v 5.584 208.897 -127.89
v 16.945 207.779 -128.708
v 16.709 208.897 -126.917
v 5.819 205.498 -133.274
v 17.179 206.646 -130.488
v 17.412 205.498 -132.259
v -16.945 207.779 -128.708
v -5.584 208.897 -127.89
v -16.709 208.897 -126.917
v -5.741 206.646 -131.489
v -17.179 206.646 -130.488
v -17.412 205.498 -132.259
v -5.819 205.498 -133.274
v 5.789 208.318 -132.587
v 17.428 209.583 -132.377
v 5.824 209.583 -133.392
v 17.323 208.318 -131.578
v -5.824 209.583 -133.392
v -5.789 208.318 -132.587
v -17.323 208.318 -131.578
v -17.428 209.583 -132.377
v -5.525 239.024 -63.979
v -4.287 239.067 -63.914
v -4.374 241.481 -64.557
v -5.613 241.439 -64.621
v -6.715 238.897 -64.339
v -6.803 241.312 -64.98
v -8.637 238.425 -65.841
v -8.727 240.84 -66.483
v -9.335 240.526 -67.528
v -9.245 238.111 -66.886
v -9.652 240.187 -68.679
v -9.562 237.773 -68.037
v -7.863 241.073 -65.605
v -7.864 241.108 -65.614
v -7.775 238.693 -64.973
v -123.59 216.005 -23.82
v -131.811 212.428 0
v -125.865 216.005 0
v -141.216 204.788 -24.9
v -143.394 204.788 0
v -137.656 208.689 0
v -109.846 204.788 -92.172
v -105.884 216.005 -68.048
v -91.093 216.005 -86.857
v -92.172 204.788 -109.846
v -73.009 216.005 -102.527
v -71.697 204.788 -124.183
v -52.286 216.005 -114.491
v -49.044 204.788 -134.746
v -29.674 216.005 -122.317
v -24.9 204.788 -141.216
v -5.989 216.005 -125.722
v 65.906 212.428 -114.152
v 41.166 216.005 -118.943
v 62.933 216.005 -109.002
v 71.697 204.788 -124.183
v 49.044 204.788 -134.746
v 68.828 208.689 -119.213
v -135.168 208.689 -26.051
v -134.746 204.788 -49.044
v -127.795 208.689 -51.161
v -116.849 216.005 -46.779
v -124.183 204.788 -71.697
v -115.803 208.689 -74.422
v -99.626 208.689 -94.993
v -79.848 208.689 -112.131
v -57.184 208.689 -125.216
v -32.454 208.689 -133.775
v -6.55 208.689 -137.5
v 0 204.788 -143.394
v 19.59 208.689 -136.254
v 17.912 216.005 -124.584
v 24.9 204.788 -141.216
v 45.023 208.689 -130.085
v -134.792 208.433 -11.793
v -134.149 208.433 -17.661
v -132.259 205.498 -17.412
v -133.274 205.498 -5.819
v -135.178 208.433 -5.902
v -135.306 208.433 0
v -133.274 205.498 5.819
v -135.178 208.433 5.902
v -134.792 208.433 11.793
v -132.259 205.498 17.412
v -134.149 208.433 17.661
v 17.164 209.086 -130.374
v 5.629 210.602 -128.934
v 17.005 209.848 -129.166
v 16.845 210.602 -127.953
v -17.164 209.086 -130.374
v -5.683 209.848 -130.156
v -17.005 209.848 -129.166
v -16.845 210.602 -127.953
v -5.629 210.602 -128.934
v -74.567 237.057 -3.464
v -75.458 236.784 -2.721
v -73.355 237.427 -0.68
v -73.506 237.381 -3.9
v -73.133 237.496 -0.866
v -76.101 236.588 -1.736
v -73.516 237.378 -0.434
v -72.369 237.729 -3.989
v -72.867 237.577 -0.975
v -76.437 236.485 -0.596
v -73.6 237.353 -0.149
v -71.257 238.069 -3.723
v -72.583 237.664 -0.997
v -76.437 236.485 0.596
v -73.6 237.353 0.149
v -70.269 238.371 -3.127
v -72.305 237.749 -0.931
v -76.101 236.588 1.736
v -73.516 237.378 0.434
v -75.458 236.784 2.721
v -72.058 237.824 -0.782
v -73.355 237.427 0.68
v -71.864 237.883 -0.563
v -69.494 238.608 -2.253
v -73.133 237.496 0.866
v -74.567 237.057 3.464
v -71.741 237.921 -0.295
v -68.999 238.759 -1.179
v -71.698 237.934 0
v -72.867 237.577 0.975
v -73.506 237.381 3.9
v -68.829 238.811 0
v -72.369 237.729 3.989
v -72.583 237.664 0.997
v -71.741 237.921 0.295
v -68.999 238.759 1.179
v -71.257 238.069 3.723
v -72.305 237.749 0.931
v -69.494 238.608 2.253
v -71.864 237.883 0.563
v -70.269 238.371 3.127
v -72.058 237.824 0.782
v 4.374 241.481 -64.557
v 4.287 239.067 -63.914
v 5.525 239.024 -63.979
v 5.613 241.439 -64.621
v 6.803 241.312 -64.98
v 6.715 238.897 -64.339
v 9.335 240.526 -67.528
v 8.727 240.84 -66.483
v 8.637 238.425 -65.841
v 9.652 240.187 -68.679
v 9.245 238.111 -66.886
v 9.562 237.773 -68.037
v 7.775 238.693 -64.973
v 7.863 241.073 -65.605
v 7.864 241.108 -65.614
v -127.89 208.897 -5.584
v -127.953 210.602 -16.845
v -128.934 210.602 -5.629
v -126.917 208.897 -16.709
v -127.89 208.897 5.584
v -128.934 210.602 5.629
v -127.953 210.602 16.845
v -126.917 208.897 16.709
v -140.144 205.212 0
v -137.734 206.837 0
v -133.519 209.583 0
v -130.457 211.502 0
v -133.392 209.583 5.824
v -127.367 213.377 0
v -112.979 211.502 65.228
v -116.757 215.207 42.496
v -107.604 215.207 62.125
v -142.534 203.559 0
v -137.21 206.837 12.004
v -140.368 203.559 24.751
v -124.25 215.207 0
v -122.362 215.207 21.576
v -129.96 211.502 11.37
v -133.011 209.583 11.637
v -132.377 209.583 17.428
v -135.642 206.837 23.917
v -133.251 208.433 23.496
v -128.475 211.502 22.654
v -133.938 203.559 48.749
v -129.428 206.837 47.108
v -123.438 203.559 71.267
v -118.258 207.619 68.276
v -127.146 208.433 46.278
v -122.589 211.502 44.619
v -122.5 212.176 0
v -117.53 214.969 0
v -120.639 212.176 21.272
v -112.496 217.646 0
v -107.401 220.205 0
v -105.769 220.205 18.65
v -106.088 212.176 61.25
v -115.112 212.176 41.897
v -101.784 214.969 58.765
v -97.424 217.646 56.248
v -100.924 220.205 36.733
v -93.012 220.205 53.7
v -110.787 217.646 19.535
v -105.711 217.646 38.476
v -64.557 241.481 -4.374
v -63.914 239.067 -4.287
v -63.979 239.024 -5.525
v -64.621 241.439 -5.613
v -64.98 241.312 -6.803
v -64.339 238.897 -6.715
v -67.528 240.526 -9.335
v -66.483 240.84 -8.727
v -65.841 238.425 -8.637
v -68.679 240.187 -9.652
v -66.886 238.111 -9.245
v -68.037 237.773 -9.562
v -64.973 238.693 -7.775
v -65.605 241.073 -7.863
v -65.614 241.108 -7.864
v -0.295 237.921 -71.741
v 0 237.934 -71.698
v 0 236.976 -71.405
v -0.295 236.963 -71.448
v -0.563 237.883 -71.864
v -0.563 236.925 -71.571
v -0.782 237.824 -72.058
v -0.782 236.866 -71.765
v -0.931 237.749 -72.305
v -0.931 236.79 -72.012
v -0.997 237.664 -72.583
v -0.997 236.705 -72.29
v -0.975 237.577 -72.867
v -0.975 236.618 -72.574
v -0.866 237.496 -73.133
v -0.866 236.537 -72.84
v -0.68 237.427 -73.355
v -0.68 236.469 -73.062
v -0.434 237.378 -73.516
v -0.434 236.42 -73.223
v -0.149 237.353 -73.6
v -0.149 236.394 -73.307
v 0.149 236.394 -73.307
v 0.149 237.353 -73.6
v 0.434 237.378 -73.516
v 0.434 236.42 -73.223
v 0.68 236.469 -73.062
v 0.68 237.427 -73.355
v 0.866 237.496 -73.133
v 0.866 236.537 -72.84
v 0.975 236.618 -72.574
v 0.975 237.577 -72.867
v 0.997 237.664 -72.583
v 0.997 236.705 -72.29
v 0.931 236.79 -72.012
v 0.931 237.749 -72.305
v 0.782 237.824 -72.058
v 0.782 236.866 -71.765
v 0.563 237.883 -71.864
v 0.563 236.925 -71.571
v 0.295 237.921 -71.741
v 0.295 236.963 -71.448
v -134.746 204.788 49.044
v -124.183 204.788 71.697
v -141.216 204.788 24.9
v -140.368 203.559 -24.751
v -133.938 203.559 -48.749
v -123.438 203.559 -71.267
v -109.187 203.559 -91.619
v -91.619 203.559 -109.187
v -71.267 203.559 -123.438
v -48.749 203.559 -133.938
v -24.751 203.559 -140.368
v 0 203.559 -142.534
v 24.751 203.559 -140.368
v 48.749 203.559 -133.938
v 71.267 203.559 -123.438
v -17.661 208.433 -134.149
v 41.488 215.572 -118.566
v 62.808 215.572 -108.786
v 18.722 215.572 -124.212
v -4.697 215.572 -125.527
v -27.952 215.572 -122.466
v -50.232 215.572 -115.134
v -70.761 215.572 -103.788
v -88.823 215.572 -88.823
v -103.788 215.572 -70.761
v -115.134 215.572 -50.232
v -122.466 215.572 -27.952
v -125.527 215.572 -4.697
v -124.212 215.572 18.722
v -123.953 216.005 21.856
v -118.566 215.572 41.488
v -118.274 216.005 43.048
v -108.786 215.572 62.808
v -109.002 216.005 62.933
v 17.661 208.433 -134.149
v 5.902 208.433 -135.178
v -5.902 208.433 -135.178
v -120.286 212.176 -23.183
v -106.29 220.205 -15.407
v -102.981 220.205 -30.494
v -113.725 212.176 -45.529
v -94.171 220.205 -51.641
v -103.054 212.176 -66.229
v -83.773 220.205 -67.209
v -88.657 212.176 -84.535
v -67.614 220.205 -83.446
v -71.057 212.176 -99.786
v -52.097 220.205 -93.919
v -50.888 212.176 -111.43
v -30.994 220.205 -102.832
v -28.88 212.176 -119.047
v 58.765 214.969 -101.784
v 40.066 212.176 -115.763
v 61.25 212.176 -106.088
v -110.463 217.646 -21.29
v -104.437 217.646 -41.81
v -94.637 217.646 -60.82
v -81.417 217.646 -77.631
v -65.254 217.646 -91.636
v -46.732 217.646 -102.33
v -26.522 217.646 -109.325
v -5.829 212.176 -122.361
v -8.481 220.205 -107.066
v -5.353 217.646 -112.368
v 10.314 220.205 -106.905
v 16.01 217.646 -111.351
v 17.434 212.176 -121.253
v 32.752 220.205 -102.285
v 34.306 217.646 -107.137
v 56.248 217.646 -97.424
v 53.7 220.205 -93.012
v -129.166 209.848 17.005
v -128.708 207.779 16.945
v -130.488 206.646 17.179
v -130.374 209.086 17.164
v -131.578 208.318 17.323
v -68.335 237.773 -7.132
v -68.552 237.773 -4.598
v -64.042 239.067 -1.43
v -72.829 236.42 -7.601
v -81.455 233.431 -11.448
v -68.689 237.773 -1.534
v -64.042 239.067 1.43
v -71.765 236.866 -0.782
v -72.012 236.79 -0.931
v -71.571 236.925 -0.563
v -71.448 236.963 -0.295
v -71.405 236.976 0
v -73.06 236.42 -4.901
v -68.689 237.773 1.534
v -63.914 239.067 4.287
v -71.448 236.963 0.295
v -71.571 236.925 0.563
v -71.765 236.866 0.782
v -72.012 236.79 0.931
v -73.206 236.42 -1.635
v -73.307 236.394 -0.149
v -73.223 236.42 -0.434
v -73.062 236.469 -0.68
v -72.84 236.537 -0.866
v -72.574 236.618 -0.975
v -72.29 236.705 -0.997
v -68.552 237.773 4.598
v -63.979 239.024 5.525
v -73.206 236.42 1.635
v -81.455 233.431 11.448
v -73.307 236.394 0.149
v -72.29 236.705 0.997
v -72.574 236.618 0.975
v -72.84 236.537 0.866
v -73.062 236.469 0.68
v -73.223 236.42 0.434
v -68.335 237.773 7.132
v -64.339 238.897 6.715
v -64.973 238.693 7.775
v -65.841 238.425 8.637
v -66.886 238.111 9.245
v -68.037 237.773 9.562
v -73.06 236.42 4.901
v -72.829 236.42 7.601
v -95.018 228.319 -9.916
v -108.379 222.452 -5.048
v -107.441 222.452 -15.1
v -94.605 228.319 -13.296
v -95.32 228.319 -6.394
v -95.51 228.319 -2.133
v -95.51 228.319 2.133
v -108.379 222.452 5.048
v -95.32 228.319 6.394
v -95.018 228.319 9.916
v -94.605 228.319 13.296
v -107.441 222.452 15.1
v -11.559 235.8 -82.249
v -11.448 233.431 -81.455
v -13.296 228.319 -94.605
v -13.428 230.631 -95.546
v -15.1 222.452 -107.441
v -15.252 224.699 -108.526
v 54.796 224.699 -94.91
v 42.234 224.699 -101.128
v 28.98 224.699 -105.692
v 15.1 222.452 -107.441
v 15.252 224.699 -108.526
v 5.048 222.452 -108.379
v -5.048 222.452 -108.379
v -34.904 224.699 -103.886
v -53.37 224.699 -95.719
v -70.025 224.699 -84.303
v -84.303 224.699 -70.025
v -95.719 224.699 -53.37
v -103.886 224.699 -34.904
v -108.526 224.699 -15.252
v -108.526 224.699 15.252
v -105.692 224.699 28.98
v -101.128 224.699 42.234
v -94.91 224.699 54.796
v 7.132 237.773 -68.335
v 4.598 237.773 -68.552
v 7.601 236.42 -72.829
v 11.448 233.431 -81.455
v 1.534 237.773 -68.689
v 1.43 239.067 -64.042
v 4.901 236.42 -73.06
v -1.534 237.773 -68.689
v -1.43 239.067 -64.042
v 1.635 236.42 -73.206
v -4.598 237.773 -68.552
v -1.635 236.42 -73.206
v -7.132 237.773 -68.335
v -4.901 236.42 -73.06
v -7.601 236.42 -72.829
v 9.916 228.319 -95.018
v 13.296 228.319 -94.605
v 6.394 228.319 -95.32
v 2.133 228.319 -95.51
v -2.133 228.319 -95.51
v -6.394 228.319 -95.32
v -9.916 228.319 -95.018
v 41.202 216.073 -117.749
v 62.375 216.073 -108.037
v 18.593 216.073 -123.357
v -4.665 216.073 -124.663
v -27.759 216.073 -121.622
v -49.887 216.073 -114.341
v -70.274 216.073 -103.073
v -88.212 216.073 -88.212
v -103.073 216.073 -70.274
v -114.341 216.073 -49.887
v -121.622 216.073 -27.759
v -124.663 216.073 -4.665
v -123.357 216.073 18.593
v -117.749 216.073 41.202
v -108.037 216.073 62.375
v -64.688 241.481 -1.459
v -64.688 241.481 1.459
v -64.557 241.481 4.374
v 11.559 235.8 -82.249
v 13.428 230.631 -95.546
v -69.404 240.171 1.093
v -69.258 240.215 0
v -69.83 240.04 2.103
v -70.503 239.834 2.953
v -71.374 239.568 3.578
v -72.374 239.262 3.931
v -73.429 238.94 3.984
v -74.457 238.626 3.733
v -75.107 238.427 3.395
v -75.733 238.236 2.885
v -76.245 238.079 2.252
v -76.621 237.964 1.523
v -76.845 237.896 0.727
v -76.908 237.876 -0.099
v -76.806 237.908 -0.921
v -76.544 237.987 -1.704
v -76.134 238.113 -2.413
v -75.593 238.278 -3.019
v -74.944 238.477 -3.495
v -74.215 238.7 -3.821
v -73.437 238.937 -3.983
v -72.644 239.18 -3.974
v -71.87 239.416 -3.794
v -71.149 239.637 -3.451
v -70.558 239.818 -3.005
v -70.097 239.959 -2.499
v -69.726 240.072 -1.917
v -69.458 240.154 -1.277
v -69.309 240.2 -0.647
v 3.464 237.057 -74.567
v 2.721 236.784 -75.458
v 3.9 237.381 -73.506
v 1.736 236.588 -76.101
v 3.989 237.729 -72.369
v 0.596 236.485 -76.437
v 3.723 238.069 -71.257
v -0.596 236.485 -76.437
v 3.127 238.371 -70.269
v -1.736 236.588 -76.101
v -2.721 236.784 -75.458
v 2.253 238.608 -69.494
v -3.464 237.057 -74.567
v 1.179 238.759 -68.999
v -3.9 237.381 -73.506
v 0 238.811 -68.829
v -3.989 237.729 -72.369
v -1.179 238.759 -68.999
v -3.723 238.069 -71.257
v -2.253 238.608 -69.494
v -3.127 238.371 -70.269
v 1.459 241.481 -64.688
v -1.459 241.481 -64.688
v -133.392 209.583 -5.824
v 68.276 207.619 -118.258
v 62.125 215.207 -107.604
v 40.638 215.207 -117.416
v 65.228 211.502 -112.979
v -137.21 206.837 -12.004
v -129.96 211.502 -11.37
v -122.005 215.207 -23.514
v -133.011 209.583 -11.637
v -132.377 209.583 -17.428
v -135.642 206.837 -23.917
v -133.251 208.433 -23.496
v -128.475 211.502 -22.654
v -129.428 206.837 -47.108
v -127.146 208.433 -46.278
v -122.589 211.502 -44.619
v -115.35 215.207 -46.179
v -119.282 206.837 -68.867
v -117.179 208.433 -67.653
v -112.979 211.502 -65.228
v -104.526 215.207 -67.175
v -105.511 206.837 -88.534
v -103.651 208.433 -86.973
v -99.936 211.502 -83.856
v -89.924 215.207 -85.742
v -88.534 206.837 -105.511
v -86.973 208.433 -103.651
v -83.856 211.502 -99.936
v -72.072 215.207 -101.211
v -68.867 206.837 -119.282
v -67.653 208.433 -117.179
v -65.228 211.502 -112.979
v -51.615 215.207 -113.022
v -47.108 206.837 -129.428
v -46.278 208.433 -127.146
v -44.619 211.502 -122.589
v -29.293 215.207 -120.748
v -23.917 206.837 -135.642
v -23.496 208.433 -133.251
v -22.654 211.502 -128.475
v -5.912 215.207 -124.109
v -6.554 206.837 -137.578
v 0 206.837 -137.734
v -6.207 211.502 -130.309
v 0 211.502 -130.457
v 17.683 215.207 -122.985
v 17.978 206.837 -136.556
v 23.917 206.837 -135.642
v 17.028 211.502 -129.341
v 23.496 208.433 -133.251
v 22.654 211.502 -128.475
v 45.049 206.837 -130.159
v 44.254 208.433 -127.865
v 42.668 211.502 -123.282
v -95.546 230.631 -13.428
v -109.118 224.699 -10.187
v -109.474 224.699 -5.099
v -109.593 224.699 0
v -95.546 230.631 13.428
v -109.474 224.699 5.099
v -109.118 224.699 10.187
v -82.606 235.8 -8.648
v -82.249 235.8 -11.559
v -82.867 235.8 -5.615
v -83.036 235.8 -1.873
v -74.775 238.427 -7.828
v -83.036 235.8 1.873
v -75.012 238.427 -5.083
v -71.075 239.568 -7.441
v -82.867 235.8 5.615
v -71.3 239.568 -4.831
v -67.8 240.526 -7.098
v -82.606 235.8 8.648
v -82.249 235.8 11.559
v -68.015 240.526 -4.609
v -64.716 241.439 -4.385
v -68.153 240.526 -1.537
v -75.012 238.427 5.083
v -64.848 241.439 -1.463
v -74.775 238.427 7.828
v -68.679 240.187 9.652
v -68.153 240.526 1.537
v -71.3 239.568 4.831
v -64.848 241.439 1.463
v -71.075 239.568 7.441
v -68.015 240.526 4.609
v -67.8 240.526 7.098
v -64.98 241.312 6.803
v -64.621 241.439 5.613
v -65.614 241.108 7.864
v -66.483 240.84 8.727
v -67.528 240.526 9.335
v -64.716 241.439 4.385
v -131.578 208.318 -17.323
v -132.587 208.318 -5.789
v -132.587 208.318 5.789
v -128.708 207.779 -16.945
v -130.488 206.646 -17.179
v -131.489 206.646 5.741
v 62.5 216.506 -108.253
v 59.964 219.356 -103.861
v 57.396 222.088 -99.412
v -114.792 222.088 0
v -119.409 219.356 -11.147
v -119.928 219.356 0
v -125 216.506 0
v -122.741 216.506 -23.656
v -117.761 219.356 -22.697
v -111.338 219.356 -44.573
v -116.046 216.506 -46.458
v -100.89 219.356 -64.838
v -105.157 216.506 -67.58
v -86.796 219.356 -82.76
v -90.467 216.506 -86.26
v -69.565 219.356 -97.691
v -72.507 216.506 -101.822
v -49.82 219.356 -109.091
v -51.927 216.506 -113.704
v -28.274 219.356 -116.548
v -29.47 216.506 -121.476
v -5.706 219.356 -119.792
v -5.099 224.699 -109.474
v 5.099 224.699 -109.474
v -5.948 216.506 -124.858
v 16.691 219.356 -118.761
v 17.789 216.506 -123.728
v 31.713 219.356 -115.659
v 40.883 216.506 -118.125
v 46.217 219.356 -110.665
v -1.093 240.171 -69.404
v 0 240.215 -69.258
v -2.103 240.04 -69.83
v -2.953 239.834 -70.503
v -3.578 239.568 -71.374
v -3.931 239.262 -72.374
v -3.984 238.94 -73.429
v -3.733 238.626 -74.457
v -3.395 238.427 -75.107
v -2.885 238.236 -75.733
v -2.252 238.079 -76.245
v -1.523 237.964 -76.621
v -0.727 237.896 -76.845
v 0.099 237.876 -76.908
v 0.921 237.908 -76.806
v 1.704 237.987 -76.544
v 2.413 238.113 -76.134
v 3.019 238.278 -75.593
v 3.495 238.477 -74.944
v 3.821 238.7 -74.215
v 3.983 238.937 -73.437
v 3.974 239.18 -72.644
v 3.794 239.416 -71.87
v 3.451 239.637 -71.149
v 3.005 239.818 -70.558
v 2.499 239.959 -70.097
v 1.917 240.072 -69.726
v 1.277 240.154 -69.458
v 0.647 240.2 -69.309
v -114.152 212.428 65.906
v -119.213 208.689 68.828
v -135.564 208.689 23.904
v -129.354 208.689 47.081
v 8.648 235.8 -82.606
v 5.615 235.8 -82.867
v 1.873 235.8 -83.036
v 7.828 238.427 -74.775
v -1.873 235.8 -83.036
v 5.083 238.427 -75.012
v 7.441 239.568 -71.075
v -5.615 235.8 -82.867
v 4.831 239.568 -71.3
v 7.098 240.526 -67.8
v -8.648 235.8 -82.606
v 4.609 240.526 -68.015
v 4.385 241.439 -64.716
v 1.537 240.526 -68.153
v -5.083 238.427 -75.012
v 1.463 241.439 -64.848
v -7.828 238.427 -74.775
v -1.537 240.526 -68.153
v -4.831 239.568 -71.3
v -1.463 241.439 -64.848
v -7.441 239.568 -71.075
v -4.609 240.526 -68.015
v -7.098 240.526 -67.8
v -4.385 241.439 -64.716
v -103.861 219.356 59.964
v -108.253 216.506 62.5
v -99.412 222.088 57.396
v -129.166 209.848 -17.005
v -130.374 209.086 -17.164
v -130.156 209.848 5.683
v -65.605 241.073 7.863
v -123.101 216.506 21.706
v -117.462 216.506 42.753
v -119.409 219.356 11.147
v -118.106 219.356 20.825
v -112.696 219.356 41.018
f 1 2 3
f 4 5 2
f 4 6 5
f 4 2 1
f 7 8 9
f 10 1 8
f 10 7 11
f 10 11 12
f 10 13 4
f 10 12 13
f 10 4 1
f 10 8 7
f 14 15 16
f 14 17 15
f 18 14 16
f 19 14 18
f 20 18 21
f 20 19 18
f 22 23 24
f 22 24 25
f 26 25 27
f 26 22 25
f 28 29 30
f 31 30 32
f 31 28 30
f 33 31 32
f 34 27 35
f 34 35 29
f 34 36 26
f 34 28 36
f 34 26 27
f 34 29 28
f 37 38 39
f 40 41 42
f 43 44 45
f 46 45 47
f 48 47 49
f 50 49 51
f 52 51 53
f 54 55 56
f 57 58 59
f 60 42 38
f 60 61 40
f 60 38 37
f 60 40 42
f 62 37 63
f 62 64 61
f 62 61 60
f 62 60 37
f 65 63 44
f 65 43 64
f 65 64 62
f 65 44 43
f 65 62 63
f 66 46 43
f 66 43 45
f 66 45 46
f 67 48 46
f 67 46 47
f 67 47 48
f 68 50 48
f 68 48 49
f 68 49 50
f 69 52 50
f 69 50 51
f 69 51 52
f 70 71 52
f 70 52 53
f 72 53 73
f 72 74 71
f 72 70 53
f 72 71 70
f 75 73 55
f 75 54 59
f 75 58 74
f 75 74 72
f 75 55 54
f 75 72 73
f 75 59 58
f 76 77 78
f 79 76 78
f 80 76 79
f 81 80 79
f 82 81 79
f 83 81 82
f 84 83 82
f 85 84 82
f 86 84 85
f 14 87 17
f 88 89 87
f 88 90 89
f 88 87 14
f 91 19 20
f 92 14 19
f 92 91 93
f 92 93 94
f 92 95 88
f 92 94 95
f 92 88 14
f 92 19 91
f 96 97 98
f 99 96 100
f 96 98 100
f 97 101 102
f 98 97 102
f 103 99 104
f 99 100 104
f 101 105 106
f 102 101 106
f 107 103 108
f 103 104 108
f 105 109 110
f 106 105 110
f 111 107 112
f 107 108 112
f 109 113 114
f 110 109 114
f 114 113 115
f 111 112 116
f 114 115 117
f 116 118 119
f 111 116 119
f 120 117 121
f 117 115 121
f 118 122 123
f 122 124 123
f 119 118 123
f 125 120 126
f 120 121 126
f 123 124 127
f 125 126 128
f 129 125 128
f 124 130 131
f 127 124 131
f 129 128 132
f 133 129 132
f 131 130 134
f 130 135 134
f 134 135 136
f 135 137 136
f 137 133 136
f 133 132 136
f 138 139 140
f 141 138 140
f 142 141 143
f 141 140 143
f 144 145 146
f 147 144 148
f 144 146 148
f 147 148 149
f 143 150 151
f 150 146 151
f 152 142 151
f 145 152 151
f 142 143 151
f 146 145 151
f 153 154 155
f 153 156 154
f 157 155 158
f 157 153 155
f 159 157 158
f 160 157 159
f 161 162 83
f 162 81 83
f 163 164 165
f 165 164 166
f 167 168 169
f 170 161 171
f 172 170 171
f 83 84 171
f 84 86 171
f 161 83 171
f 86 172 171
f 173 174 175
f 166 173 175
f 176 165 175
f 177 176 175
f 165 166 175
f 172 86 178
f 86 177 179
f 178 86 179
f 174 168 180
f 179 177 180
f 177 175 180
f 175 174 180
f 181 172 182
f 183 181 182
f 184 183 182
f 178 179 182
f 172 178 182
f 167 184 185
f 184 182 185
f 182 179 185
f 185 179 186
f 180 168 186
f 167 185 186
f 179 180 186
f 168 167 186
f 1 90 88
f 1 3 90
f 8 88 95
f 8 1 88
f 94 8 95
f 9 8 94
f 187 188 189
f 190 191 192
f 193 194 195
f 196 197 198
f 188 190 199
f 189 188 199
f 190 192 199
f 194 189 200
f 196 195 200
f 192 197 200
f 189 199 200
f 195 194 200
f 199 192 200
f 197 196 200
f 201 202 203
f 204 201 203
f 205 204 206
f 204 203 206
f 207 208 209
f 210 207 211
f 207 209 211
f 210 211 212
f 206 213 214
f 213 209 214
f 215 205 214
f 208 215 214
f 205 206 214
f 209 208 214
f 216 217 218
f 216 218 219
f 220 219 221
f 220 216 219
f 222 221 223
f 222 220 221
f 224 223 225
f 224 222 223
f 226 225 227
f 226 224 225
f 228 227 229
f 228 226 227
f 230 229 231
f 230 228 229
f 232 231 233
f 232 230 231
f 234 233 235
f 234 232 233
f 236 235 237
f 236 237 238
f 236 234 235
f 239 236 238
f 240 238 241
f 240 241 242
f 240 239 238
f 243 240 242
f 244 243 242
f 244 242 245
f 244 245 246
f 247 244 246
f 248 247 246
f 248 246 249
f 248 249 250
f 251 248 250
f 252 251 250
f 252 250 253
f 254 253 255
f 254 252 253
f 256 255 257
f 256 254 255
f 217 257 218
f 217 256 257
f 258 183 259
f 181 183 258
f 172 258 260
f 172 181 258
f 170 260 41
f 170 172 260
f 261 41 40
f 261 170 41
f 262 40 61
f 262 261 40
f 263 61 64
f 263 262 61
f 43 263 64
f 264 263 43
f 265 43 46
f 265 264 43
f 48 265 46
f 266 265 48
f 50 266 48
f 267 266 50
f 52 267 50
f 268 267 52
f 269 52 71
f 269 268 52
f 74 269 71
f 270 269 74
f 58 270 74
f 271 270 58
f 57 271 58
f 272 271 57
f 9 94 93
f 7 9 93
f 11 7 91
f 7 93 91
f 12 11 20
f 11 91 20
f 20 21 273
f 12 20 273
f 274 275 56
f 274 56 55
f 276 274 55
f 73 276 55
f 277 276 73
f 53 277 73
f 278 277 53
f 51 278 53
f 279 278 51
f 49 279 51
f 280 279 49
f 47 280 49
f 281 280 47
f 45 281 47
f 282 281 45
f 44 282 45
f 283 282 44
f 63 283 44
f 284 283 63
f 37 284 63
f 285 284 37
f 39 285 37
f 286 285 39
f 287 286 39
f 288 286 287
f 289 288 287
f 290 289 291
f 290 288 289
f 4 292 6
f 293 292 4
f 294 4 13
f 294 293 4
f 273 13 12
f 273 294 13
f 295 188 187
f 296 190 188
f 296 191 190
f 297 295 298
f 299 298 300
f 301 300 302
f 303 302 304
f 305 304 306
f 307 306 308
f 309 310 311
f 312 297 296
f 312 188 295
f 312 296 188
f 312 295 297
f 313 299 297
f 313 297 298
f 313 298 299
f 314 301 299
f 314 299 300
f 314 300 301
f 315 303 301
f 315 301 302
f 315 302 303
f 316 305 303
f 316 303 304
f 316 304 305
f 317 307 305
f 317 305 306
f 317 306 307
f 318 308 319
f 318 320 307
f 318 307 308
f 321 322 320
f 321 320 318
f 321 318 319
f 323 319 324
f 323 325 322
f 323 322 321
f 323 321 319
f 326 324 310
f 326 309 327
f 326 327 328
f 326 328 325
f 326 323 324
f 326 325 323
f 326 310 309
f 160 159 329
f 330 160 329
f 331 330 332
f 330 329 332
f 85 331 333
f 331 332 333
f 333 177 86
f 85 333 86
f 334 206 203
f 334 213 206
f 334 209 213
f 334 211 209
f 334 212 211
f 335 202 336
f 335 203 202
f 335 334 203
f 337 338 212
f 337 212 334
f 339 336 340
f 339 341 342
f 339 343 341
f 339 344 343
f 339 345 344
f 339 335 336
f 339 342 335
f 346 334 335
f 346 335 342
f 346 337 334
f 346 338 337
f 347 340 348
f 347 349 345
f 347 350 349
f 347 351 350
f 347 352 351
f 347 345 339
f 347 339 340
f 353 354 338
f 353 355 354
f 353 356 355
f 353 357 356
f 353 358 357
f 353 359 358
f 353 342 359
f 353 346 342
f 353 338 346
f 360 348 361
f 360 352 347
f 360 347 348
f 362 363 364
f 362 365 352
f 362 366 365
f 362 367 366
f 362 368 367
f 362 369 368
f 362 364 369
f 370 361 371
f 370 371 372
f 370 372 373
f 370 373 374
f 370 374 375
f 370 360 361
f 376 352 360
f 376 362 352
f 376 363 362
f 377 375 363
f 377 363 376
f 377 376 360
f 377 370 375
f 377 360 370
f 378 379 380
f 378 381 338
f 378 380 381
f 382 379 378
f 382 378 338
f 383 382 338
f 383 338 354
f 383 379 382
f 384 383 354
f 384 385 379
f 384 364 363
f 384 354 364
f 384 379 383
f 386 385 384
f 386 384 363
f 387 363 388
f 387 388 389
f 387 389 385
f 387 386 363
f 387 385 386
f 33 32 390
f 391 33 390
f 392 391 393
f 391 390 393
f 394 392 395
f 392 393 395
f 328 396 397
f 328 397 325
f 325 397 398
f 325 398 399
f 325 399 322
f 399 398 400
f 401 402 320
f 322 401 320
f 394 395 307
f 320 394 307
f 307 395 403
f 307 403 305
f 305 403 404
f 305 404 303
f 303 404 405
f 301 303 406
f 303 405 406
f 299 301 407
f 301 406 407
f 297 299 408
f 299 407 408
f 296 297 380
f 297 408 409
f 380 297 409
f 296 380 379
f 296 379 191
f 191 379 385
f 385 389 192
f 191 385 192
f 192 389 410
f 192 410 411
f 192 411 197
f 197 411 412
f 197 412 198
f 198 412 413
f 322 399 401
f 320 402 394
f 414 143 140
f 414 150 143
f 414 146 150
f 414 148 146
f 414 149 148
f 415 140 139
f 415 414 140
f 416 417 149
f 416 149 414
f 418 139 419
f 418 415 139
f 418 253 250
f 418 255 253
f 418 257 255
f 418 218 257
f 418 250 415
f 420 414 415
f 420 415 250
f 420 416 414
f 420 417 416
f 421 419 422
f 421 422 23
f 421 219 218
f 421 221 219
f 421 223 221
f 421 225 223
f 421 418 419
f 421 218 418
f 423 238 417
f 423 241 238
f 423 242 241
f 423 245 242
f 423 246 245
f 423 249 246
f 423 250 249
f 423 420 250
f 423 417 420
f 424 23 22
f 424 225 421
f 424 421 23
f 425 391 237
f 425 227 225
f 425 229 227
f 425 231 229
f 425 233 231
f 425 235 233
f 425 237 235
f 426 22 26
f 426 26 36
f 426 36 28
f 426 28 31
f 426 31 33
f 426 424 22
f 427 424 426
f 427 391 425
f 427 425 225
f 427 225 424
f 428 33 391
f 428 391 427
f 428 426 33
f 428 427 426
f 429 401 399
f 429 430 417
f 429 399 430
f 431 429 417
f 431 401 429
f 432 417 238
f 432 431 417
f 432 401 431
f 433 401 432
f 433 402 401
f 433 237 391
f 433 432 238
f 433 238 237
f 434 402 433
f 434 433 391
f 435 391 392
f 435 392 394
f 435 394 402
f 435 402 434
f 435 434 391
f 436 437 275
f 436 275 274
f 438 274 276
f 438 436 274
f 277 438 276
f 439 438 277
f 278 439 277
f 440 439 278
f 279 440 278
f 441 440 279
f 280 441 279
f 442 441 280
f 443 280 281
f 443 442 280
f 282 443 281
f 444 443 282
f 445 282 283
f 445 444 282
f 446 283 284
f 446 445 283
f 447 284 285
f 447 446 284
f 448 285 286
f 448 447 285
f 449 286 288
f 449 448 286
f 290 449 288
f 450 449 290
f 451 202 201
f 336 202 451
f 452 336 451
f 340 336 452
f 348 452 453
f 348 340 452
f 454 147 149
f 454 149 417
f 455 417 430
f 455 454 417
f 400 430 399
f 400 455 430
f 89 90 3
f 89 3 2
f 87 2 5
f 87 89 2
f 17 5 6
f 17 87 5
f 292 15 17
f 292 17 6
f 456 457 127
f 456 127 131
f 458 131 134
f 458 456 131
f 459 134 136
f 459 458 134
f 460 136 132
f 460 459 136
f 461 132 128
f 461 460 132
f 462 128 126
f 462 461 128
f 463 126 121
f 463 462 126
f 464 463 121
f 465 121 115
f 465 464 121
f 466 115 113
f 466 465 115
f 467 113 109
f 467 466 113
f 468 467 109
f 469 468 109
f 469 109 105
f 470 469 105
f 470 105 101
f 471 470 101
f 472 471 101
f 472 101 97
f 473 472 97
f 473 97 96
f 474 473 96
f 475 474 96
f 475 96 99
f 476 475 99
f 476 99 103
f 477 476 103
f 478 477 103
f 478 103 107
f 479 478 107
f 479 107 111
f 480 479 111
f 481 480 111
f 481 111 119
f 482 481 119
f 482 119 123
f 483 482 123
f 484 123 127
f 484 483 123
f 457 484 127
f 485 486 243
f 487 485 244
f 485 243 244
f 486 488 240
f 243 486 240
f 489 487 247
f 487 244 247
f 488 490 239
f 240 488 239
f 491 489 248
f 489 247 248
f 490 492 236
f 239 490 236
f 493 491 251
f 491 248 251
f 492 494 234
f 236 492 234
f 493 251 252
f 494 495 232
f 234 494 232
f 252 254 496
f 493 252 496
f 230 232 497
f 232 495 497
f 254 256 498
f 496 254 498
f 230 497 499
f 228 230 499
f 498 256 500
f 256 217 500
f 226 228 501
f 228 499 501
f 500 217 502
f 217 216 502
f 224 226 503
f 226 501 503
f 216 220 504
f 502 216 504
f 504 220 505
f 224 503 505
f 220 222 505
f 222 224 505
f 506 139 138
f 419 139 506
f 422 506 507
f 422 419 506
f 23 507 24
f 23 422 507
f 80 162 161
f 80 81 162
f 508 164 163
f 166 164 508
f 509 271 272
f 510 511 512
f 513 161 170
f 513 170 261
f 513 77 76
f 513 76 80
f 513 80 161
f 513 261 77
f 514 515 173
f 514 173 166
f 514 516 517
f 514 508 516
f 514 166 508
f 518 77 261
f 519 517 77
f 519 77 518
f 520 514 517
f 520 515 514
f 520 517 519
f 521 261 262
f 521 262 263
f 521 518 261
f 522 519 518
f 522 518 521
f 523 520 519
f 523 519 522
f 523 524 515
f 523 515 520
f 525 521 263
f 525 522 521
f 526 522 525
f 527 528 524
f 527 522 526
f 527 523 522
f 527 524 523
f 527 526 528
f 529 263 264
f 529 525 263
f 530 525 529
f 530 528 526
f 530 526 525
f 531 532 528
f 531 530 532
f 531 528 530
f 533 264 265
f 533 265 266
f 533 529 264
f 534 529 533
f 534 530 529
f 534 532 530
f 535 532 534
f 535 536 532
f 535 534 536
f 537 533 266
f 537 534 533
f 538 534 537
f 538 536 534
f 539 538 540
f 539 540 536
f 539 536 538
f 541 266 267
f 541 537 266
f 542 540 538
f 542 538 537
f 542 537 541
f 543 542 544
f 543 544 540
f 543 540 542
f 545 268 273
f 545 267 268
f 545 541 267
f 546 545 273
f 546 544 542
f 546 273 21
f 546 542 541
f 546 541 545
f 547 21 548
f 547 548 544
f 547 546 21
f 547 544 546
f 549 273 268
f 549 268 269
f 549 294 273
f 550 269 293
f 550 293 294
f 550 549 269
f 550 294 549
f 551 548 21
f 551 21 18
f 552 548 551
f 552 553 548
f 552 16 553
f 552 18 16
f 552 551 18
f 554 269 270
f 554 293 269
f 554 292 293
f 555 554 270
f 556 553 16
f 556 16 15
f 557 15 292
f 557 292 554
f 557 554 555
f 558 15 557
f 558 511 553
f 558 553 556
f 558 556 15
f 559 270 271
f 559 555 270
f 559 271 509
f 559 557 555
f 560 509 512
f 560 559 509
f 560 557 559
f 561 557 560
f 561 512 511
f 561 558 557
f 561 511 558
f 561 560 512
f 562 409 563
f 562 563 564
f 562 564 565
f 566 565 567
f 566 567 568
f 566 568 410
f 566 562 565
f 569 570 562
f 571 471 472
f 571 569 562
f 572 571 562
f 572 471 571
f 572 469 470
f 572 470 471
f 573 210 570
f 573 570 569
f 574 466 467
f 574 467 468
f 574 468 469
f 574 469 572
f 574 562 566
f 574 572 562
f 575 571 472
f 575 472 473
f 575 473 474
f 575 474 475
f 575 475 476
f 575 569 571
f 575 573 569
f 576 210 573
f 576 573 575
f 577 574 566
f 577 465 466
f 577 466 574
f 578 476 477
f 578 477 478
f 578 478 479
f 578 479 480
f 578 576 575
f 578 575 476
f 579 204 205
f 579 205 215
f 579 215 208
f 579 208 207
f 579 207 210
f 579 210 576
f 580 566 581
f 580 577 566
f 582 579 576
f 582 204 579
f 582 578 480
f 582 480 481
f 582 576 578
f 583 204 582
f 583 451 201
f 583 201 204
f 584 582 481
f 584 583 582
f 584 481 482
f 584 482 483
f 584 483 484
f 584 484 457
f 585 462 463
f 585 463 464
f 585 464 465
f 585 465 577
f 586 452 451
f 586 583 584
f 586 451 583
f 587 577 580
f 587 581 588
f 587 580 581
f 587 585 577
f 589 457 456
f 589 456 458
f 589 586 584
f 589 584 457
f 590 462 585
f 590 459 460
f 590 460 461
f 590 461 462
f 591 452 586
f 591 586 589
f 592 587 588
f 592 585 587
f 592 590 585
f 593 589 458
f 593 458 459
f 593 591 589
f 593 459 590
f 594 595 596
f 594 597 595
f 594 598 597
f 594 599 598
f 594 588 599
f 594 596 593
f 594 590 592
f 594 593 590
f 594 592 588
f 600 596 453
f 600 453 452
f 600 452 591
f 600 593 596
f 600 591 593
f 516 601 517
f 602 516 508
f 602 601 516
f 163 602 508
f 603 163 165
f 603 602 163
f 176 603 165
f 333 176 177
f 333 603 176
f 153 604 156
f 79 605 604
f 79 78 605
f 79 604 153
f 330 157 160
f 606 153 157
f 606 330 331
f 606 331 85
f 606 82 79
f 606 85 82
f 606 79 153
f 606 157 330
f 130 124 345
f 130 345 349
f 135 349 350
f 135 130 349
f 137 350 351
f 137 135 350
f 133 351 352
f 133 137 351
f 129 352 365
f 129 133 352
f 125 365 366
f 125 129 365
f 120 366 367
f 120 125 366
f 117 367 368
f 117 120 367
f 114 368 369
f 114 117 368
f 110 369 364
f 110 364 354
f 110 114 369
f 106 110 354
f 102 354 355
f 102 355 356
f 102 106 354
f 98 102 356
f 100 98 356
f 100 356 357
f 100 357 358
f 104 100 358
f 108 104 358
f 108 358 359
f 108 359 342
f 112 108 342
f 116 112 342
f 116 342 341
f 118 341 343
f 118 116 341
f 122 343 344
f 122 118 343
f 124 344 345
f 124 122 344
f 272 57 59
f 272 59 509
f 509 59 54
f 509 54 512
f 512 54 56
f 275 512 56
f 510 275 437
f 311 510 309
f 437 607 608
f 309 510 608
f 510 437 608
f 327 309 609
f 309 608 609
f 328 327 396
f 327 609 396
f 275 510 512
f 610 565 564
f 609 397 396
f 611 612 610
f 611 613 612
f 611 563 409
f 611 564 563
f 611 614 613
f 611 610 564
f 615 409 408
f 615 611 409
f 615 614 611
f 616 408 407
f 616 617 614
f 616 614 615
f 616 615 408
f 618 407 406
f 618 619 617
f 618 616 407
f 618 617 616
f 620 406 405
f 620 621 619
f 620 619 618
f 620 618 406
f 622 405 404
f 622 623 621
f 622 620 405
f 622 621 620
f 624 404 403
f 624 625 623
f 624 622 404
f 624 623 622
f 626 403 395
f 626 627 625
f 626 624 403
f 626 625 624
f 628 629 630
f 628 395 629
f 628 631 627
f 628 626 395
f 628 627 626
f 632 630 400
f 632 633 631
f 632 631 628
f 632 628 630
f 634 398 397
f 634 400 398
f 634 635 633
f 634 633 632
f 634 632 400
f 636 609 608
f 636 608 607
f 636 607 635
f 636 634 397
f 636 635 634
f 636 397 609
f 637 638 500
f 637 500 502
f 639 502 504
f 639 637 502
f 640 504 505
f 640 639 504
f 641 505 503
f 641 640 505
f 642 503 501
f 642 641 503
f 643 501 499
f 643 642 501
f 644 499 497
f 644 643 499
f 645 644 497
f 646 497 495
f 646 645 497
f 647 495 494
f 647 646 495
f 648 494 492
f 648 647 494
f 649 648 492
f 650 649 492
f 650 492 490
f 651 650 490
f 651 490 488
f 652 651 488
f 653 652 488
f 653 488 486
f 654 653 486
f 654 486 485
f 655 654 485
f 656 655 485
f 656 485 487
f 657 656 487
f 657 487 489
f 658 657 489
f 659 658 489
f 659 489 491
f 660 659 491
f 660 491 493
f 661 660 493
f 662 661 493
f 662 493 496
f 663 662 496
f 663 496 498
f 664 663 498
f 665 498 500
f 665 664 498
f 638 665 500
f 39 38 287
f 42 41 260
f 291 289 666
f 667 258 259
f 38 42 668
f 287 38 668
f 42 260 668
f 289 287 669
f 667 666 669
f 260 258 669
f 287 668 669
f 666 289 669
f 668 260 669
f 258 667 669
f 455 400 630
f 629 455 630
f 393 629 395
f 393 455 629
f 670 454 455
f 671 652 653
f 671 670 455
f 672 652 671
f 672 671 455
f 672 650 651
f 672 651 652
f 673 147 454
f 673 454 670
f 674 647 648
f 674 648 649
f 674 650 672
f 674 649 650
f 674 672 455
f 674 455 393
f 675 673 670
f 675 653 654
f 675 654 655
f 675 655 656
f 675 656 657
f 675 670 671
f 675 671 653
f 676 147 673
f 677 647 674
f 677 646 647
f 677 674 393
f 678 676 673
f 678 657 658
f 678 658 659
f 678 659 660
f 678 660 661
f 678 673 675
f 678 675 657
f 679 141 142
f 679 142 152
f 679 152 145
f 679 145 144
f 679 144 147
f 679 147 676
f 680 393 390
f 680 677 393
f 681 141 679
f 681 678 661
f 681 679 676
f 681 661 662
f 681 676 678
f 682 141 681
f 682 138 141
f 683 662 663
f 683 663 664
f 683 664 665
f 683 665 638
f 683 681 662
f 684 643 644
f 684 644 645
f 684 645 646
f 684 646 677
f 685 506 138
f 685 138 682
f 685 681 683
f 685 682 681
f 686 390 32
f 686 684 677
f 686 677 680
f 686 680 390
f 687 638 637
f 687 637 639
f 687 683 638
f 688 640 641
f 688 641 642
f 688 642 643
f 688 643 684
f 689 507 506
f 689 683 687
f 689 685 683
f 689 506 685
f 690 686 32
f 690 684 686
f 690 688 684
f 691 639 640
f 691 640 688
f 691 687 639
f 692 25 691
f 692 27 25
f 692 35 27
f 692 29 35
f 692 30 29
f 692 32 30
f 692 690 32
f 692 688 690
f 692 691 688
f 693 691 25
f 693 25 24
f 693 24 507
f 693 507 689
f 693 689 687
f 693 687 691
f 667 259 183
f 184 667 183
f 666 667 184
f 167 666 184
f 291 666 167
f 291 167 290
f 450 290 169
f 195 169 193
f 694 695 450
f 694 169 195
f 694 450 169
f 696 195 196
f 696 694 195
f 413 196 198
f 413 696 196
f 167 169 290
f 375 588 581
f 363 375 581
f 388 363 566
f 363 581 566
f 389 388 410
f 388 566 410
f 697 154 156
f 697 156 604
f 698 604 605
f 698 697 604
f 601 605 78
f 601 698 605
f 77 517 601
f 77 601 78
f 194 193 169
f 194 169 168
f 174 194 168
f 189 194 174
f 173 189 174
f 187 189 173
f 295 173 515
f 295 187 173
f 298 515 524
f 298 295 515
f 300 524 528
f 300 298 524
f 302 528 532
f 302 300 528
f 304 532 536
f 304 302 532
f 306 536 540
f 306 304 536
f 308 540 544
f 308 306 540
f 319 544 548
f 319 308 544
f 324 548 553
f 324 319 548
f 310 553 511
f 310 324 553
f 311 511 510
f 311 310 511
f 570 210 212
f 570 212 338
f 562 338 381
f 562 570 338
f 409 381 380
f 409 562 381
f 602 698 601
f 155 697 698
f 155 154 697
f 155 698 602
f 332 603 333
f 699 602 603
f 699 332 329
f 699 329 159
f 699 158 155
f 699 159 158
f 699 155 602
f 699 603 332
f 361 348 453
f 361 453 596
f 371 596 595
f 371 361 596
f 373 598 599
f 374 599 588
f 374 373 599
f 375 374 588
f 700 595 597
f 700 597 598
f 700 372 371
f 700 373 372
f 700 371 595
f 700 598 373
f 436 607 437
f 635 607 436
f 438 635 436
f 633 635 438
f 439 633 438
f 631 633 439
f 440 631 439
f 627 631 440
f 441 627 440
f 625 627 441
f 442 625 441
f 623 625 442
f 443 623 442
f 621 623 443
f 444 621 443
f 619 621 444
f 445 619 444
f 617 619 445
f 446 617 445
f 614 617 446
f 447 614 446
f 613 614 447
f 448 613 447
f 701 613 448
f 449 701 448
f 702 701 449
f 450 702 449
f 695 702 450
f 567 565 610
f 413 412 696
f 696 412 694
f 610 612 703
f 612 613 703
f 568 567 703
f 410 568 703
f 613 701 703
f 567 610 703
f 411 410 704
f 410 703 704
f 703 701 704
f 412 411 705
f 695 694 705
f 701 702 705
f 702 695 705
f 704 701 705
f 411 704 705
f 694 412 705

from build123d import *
from build123d.topology import SkipClean

# Parameters (mm, degrees)
REVOLVE1_ANGLE           = 30
REVOLVE1_OTHER_WAY_ANGLE = 120
REVOLVE2_ANGLE           = 15
CIRPATTERN1_COUNT        = 4
REVOLVE4_ANGLE           = 16
CUT_REVOLVE4_START       = -250
CUT_REVOLVE4_OUTLINE_R   = 4
CUT_REVOLVE4_DEPTH       = 1.5
CUT_REVOLVE4_START_2     = -248.5
CUT_REVOLVE4_2_OUTLINE_R = 1
CUT_REVOLVE4_2_DEPTH     = 1.00202
FILLET2_R                = 5
CIRPATTERN5_COUNT        = 2
CIRPATTERN5_ANGLE        = 90
FILLET2_OF_CIRPATTERN5_R = 5


# Read off the part's stored shape, not the designer's step: Revolve2, Revolve4, Cut-Revolve4
with BuildPart() as part:
    # Sketch1 → Revolve1 (revolve)
    with BuildSketch(Plane.XY):
        with BuildLine():
            ThreePointArc((-142.533744, 203.559283), (-133.518953, 209.582774), (-124.25, 215.207313))
            Line((-124.25, 215.207313), (-125, 216.506351))
            ThreePointArc((-125, 216.506351), (-134.324902, 210.847861), (-143.394109, 204.788011))
            Line((-143.394109, 204.788011), (-142.533744, 203.559283))
        make_face()
        with BuildLine():
            ThreePointArc((-124.25, 215.207313), (-64.316533, 240.032568), (0, 248.5))
            Line((0, 248.5), (0, 250))
            ThreePointArc((0, 250), (-64.704761, 241.481457), (-125, 216.506351))
            Line((-125, 216.506351), (-124.25, 215.207313))
        make_face()
        with BuildLine():
            ThreePointArc((-122.5, 212.176224), (-63.410666, 236.651827), (0, 245))
            Line((0, 245), (0, 248.5))
            ThreePointArc((0, 248.5), (-64.316533, 240.032568), (-124.25, 215.207313))
            Line((-124.25, 215.207313), (-122.5, 212.176224))
        make_face()
    revolve(axis=Axis((0, 0, 0), (0, 1, 0)), revolution_arc=REVOLVE1_ANGLE)

    # Sketch1 → Revolve1 other way (revolve)
    with SkipClean():  # the faces are left unmerged after this step: merging them gives an invalid solid
        with BuildSketch(Plane.XY):
            with BuildLine():
                ThreePointArc((-142.533744, 203.559283), (-133.518953, 209.582774), (-124.25, 215.207313))
                Line((-124.25, 215.207313), (-125, 216.506351))
                ThreePointArc((-125, 216.506351), (-134.324902, 210.847861), (-143.394109, 204.788011))
                Line((-143.394109, 204.788011), (-142.533744, 203.559283))
            make_face()
            with BuildLine():
                ThreePointArc((-124.25, 215.207313), (-64.316533, 240.032568), (0, 248.5))
                Line((0, 248.5), (0, 250))
                ThreePointArc((0, 250), (-64.704761, 241.481457), (-125, 216.506351))
                Line((-125, 216.506351), (-124.25, 215.207313))
            make_face()
            with BuildLine():
                ThreePointArc((-122.5, 212.176224), (-63.410666, 236.651827), (0, 245))
                Line((0, 245), (0, 248.5))
                ThreePointArc((0, 248.5), (-64.316533, 240.032568), (-124.25, 215.207313))
                Line((-124.25, 215.207313), (-122.5, 212.176224))
            make_face()
        revolve(axis=Axis((0, 0, 0), (0, -1, 0)), revolution_arc=REVOLVE1_OTHER_WAY_ANGLE)

    # Revolve2 outline → Revolve2 (revolve)
    with SkipClean():  # the faces are left unmerged after this step: merging them gives an invalid solid
        with BuildSketch(Plane(origin=(0, 0, 0), x_dir=(-0.9914448613738103, 0, -0.13052619222005243), z_dir=(0.13052619222005243, 0, -0.9914448613738103))):
            with BuildLine():
                Line((133.4007, 205.497575), (135.306424, 208.433255))
                Line((135.306424, 208.433255), (135.306424, 209.582774))
                Line((135.306424, 209.582774), (133.518953, 209.582774))
                Line((133.518953, 209.582774), (132.713003, 208.317687))
                ThreePointArc((132.713003, 208.317687), (130.890058, 209.46788), (129.057145, 210.602121))
                Line((129.057145, 210.602121), (128.012148, 208.89684))
                ThreePointArc((128.012148, 208.89684), (130.717474, 207.214724), (133.4007, 205.497575))
            make_face()
        revolve2 = revolve(axis=Axis((0, 0, 0), (0, 1, 0)), revolution_arc=REVOLVE2_ANGLE)

    # CirPattern1: Revolve2 ×4 about axis, 2 skipped
    with SkipClean():  # the faces are left unmerged after this step: merging them gives an invalid solid
        cirpattern1_axis = Axis((0, 0, 0), (0, -1, 0))
        add([revolve2.rotate(cirpattern1_axis, i * 360 / CIRPATTERN1_COUNT) for i in range(1, CIRPATTERN1_COUNT) if i not in (2, 3)])

    # Sketch4 → Cut-Revolve1 (revolve, cut)
    with BuildSketch(Plane.XY):
        with BuildLine():
            Line((0, 250), (0, 0))
            Line((0, 0), (109.592787, 224.698512))
            ThreePointArc((109.592787, 224.698512), (56.237764, 243.592516), (0, 250))
        make_face()
    revolve(axis=Axis((0, 0, 0), (0, 1, 0)), mode=Mode.SUBTRACT)

    # Revolve4 outline → Revolve4 (revolve)
    with BuildSketch(Plane(origin=(0, 0, 0), x_dir=(-0.9902680687415703, 0, -0.13917310096006574), z_dir=(0.13917310096006574, 0, -0.9902680687415703))):
        with BuildLine():
            Line((108.496859, 222.451526), (114.084698, 222.451526))
            ThreePointArc((114.084698, 222.451526), (89.899679, 233.276762), (64.704761, 241.481457))
            Line((64.704761, 241.481457), (64.057714, 239.066642))
            ThreePointArc((64.057714, 239.066642), (86.676327, 231.826367), (108.496859, 222.451526))
        make_face()
    revolve4 = revolve(axis=Axis((0, 0, 0), (0, 1, 0)), revolution_arc=REVOLVE4_ANGLE)

    # Cut-Revolve4 outline → Cut-Revolve4 (cut)
    with BuildSketch(Plane(origin=(0, 0, 0), x_dir=(0.956304755963035, 0.29237170472273805, 0), z_dir=(0.29237170472273805, -0.9563047559630351, 0)).offset(CUT_REVOLVE4_START)):
        Circle(CUT_REVOLVE4_OUTLINE_R)
    cut_revolve4 = extrude(amount=CUT_REVOLVE4_DEPTH, mode=Mode.SUBTRACT)

    # Cut-Revolve4 2 outline → Cut-Revolve4 2 (cut)
    with BuildSketch(Plane(origin=(0, 0, 0), x_dir=(0.956304755963035, 0.29237170472273805, 0), z_dir=(0.29237170472273805, -0.9563047559630351, 0)).offset(CUT_REVOLVE4_START_2)):
        Circle(CUT_REVOLVE4_2_OUTLINE_R)
    cut_revolve4_2 = extrude(amount=CUT_REVOLVE4_2_DEPTH, mode=Mode.SUBTRACT)

    # Fillet2
    fillet2_edges = [part.edges().sort_by_distance(p)[0] for p in [
        (-63.754684, 240.274049, -8.960136),
        (-63.754684, 240.274049, 8.960136),
    ]]
    fillet(fillet2_edges, radius=FILLET2_R)

    # CirPattern5: Revolve4, Cut-Revolve4, Cut-Revolve4 2 ×2 about axis
    cirpattern5_axis = Axis((0, 0, 0), (0, -1, 0))
    add([revolve4.rotate(cirpattern5_axis, i * CIRPATTERN5_ANGLE / (CIRPATTERN5_COUNT - 1)) for i in range(1, CIRPATTERN5_COUNT)])
    add([cut_revolve4.rotate(cirpattern5_axis, i * CIRPATTERN5_ANGLE / (CIRPATTERN5_COUNT - 1)) for i in range(1, CIRPATTERN5_COUNT)], mode=Mode.SUBTRACT)
    add([cut_revolve4_2.rotate(cirpattern5_axis, i * CIRPATTERN5_ANGLE / (CIRPATTERN5_COUNT - 1)) for i in range(1, CIRPATTERN5_COUNT)], mode=Mode.SUBTRACT)

    # Fillet2 of CirPattern5
    fillet2_of_cirpattern5_edges = [part.edges().sort_by_distance(p)[0] for p in [
        (8.960136, 240.274049, -63.754684),
        (-8.960136, 240.274049, -63.754684),
    ]]
    fillet(fillet2_of_cirpattern5_edges, radius=FILLET2_OF_CIRPATTERN5_R)

    # Sketch11 → Cut-Revolve5 (revolve, cut)
    with BuildSketch(Plane.XY):
        with BuildLine():
            ThreePointArc((-125.615023, 215.571603), (-125.182763, 215.822904), (-124.75, 216.073338))
            Line((-124.75, 216.073338), (-125, 216.506351))
            ThreePointArc((-125, 216.506351), (-125.432764, 216.255917), (-125.865025, 216.004619))
            Line((-125.865025, 216.004619), (-125.615023, 215.571603))
        make_face()
    revolve(axis=Axis((0, 0, 0), (0, 1, 0)), mode=Mode.SUBTRACT)


solid = part.part
